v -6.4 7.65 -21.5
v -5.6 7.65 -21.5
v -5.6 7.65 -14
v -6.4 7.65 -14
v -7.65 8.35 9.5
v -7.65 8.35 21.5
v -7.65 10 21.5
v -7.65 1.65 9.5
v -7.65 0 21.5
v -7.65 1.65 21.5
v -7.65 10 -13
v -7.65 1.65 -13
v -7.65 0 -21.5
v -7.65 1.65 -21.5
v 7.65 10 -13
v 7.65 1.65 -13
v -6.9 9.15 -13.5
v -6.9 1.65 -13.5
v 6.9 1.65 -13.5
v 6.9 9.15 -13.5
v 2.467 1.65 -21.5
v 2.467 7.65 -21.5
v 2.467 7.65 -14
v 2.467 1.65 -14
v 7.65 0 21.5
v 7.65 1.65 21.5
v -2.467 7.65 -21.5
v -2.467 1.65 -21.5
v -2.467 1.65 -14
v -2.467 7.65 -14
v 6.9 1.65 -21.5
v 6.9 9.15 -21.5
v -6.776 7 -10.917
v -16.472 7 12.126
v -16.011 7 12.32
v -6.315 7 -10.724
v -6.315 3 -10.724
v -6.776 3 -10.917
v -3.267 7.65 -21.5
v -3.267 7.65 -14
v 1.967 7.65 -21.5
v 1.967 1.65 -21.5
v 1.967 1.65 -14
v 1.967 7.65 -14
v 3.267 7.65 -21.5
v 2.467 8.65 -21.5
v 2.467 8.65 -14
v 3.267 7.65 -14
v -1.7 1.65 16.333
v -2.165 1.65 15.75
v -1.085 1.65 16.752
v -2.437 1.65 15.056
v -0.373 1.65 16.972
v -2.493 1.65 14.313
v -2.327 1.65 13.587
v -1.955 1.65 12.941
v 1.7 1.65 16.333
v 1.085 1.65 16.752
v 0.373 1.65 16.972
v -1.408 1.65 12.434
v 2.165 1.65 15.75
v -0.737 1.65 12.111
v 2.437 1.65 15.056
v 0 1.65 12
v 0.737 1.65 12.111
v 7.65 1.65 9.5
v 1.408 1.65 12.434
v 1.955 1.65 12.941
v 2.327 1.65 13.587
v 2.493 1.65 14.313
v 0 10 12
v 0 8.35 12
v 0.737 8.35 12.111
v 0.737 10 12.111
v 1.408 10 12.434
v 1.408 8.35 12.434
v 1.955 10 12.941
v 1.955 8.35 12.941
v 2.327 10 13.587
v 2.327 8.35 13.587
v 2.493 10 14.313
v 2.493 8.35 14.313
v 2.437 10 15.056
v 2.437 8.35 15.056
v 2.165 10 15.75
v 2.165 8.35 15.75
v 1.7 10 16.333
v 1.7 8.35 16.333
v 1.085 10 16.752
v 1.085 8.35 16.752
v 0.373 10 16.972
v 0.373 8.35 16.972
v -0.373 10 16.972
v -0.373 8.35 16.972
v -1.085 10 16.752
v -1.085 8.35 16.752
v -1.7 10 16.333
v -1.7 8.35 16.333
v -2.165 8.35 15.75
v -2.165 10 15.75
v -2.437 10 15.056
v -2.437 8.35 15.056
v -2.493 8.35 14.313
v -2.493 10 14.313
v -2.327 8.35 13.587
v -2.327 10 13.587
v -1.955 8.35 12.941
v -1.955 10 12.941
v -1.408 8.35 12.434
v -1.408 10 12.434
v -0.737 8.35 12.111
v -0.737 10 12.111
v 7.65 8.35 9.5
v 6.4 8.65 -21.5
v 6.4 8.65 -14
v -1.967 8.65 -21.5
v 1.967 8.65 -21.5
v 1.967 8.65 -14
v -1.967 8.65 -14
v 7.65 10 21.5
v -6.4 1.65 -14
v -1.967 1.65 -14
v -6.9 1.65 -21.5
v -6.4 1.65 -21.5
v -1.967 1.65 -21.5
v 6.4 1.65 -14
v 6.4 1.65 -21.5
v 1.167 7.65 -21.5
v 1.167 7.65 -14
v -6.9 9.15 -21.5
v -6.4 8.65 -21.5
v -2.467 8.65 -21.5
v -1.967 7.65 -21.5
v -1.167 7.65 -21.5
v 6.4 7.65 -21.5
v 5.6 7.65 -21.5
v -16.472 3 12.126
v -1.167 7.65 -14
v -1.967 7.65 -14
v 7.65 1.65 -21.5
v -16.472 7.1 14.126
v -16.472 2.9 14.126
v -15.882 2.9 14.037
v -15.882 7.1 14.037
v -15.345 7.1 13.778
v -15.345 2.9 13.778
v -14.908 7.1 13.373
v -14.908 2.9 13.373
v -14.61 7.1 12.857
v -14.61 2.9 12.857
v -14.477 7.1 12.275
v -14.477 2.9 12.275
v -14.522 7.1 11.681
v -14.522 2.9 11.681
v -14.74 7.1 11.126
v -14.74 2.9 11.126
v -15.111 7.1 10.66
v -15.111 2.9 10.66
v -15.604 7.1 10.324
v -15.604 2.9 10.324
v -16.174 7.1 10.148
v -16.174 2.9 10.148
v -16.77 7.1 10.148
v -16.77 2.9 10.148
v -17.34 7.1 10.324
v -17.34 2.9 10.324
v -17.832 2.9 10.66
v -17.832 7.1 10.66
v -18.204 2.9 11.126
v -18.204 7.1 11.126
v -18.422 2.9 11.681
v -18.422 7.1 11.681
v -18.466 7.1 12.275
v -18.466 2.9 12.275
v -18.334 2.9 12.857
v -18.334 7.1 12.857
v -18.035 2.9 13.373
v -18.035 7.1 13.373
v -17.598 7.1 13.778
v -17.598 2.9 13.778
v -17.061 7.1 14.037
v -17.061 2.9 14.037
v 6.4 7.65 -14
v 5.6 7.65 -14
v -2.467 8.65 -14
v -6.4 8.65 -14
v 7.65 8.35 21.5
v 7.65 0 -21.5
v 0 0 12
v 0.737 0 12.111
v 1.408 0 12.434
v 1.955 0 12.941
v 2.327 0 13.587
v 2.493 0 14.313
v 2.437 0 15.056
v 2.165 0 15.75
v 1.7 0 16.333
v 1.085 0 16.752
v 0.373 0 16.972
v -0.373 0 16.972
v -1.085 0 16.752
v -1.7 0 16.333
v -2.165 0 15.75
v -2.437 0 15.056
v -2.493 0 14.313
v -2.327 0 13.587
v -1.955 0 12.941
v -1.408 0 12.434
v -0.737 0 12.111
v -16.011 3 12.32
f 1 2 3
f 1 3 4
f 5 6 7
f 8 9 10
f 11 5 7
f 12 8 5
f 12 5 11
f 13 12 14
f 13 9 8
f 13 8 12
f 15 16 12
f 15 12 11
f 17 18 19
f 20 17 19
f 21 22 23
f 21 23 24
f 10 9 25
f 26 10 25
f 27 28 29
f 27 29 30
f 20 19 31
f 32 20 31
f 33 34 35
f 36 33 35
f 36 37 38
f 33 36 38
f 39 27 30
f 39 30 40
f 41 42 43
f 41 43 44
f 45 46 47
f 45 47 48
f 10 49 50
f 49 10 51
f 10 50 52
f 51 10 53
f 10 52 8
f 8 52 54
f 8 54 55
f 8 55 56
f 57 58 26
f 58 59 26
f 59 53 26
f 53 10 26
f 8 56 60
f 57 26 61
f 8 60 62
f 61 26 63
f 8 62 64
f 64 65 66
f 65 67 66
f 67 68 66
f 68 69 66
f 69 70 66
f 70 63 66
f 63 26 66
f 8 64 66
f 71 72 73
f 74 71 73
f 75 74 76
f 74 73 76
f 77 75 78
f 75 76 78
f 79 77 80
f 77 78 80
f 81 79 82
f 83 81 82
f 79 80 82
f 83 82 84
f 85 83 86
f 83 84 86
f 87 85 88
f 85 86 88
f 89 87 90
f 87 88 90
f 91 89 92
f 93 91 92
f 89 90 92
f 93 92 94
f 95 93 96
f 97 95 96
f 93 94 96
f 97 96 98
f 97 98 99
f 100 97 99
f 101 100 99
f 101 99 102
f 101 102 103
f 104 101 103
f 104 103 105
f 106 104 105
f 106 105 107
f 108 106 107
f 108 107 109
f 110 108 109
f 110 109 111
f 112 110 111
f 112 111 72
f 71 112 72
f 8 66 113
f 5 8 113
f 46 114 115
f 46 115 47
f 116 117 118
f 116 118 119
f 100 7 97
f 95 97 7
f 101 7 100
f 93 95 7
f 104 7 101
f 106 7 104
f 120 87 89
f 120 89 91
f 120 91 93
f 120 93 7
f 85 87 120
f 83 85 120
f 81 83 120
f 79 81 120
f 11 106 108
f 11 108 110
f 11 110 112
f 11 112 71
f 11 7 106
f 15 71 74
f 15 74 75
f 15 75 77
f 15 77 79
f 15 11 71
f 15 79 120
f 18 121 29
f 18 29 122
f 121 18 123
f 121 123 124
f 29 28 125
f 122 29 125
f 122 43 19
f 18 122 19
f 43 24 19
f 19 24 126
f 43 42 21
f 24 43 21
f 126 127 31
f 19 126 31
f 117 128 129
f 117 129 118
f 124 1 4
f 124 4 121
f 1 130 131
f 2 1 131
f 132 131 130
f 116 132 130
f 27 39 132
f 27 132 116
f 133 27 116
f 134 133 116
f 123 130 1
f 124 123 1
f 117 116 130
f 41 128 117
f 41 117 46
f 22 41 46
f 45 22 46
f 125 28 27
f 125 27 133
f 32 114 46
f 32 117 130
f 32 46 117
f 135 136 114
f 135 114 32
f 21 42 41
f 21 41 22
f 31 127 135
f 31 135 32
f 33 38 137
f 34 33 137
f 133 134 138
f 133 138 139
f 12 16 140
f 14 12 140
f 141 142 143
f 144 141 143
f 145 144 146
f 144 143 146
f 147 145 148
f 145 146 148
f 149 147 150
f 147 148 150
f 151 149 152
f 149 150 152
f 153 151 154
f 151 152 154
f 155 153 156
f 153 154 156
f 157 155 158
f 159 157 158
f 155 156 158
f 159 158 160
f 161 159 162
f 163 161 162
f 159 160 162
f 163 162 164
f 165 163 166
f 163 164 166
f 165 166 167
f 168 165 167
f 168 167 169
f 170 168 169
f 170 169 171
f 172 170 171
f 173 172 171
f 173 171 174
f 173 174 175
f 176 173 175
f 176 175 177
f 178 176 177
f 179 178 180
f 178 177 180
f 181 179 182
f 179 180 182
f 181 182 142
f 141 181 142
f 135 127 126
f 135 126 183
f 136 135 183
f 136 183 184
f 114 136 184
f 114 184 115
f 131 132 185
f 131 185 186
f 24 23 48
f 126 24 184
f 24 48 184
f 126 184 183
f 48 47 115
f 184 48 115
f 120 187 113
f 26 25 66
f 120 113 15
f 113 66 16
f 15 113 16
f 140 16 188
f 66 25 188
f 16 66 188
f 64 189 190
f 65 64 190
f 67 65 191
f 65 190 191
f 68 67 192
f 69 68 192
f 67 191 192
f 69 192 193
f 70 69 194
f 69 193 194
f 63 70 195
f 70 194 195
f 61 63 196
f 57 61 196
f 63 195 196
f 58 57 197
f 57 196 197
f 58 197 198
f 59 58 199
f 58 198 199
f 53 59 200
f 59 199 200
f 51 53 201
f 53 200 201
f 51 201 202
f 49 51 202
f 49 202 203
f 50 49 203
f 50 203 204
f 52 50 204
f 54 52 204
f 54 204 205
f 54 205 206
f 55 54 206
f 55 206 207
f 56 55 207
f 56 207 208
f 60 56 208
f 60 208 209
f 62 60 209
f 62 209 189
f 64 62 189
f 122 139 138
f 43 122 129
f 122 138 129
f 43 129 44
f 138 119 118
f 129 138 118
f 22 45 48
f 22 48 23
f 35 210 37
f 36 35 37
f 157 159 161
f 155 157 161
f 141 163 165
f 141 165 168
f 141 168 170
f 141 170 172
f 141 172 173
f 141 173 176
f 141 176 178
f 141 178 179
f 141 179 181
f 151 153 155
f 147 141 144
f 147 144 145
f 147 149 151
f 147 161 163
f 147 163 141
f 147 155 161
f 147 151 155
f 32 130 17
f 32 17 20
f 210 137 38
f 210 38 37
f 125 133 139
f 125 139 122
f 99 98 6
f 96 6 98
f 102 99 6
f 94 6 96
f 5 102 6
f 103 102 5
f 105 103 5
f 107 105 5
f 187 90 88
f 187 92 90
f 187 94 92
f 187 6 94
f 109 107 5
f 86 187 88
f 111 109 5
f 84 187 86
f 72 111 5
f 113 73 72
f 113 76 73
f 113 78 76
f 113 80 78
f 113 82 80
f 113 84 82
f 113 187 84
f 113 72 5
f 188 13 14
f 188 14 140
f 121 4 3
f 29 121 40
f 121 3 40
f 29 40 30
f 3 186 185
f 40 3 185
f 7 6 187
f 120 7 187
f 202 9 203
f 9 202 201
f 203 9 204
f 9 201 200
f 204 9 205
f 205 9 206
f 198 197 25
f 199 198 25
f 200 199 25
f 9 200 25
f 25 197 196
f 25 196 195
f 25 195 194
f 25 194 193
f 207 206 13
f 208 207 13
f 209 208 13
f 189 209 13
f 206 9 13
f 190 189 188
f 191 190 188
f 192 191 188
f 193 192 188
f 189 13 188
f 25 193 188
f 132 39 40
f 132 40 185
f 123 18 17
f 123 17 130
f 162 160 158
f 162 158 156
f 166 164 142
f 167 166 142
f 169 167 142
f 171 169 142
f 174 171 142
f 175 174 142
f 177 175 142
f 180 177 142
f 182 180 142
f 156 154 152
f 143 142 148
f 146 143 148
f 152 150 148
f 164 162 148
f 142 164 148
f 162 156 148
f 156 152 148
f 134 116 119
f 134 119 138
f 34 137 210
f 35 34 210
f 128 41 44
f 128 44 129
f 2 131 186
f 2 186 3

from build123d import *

# Parameters (mm, degrees)
SKETCH1_W                = 15.3
SKETCH1_H                = 43
BOSS_EXTRUDE1_DEPTH      = 10
SKETCH2_W                = 12
SKETCH2_H                = 6.7
SKETCH2_W_2              = 8.5
SKETCH2_H_2              = 8.35
CUT_EXTRUDE1_DEPTH       = 29.219496806
SKETCH3_W                = 13.8
SKETCH3_H                = 8
BOSS_EXTRUDE2_DEPTH      = 7.5
CUT_EXTRUDE2_DEPTH       = 7.5
LPATTERN1_COUNT          = 3
LPATTERN1_PITCH          = 4.433333333
BOSS_EXTRUDE3_DEPTH      = 4
BOSS_EXTRUDE4_DEPTH      = 4.1
BOSS_EXTRUDE4_DEPTH_BACK = 0.1
SKETCH7_R                = 2
SKETCH8_R                = 2.5
CUT_EXTRUDE3_DEPTH       = 31.057587225


with BuildPart() as part:
    # Sketch1 → Boss-Extrude1 (new body)
    with BuildSketch(Plane(origin=(0, 0, 0), x_dir=(1, 0, 0), z_dir=(0, 1, 0))):
        Rectangle(SKETCH1_W, SKETCH1_H)
    extrude(amount=BOSS_EXTRUDE1_DEPTH)

    # Sketch2 → Cut-Extrude1 (cut, through all)
    with BuildSketch(Plane(origin=(7.65, 0, 0), x_dir=(0, 0, -1), z_dir=(1, 0, 0))):
        with Locations((-15.5, 5)):
            Rectangle(SKETCH2_W, SKETCH2_H)
        with Locations((17.25, 5.825)):
            Rectangle(SKETCH2_W_2, SKETCH2_H_2)
    extrude(amount=-CUT_EXTRUDE1_DEPTH, mode=Mode.SUBTRACT)

    # Sketch8 → Cut-Extrude3 (cut, through all)
    with BuildSketch(Plane.XZ):
        with Locations(Location((0, 14.5, 0), (0, 0, 270))):
            Circle(SKETCH8_R)
    extrude(amount=-CUT_EXTRUDE3_DEPTH, mode=Mode.SUBTRACT)


with BuildPart() as body_2:
    # Sketch3 → Boss-Extrude2 (new body)
    with BuildSketch(Plane(origin=(0, 1.65, 0), x_dir=(1, 0, 0), z_dir=(0, 1, 0))):
        with Locations((0, 17.5)):
            Rectangle(SKETCH3_W, SKETCH3_H)
    extrude(amount=BOSS_EXTRUDE2_DEPTH)

    # Sketch4 → Cut-Extrude2 (cut)
    with BuildSketch(Plane(origin=(0, 0, -21.5), x_dir=(-1, 0, 0), z_dir=(0, 0, -1))):
        Polygon((-6.4, 1.65), (-6.4, 7.65), (-5.6, 7.65), (-6.3999967, 8.65), (-2.4666667, 8.65), (-3.2666667, 7.65), (-2.4666667, 7.65), (-2.4666667, 1.65), align=None)
    cut_extrude2 = extrude(amount=-CUT_EXTRUDE2_DEPTH, mode=Mode.SUBTRACT)

    # LPattern1: Cut-Extrude2 ×3
    with Locations(*[(-i * LPATTERN1_PITCH, 0, 0) for i in range(1, LPATTERN1_COUNT)]):
        add(cut_extrude2, mode=Mode.SUBTRACT)


with BuildPart() as body_3:
    # Sketch6 → Boss-Extrude3 (new body)
    with BuildSketch(Plane(origin=(0, 3, 0), x_dir=(1, 0, 0), z_dir=(0, 1, 0))):
        Polygon((-6.77634418, 10.917443401), (-16.471831252, -12.125940258), (-16.010963579, -12.319849999), (-6.315476506, 10.723533659), align=None)
    extrude(amount=BOSS_EXTRUDE3_DEPTH)


with BuildPart() as body_4:
    # Sketch7 → Boss-Extrude4 (new, two sides: drawn at the far end of the back side and taken through both)
    with BuildSketch(Plane(origin=(0, 3, 0), x_dir=(1, 0, 0), z_dir=(0, 1, 0)).offset(-BOSS_EXTRUDE4_DEPTH_BACK)):
        with Locations(Location((-16.471831252, -12.125940258, 0), (0, 0, 270))):
            Circle(SKETCH7_R)
    extrude(amount=BOSS_EXTRUDE4_DEPTH + BOSS_EXTRUDE4_DEPTH_BACK)


solid = Compound([part.part, body_2.part, body_3.part, body_4.part])
